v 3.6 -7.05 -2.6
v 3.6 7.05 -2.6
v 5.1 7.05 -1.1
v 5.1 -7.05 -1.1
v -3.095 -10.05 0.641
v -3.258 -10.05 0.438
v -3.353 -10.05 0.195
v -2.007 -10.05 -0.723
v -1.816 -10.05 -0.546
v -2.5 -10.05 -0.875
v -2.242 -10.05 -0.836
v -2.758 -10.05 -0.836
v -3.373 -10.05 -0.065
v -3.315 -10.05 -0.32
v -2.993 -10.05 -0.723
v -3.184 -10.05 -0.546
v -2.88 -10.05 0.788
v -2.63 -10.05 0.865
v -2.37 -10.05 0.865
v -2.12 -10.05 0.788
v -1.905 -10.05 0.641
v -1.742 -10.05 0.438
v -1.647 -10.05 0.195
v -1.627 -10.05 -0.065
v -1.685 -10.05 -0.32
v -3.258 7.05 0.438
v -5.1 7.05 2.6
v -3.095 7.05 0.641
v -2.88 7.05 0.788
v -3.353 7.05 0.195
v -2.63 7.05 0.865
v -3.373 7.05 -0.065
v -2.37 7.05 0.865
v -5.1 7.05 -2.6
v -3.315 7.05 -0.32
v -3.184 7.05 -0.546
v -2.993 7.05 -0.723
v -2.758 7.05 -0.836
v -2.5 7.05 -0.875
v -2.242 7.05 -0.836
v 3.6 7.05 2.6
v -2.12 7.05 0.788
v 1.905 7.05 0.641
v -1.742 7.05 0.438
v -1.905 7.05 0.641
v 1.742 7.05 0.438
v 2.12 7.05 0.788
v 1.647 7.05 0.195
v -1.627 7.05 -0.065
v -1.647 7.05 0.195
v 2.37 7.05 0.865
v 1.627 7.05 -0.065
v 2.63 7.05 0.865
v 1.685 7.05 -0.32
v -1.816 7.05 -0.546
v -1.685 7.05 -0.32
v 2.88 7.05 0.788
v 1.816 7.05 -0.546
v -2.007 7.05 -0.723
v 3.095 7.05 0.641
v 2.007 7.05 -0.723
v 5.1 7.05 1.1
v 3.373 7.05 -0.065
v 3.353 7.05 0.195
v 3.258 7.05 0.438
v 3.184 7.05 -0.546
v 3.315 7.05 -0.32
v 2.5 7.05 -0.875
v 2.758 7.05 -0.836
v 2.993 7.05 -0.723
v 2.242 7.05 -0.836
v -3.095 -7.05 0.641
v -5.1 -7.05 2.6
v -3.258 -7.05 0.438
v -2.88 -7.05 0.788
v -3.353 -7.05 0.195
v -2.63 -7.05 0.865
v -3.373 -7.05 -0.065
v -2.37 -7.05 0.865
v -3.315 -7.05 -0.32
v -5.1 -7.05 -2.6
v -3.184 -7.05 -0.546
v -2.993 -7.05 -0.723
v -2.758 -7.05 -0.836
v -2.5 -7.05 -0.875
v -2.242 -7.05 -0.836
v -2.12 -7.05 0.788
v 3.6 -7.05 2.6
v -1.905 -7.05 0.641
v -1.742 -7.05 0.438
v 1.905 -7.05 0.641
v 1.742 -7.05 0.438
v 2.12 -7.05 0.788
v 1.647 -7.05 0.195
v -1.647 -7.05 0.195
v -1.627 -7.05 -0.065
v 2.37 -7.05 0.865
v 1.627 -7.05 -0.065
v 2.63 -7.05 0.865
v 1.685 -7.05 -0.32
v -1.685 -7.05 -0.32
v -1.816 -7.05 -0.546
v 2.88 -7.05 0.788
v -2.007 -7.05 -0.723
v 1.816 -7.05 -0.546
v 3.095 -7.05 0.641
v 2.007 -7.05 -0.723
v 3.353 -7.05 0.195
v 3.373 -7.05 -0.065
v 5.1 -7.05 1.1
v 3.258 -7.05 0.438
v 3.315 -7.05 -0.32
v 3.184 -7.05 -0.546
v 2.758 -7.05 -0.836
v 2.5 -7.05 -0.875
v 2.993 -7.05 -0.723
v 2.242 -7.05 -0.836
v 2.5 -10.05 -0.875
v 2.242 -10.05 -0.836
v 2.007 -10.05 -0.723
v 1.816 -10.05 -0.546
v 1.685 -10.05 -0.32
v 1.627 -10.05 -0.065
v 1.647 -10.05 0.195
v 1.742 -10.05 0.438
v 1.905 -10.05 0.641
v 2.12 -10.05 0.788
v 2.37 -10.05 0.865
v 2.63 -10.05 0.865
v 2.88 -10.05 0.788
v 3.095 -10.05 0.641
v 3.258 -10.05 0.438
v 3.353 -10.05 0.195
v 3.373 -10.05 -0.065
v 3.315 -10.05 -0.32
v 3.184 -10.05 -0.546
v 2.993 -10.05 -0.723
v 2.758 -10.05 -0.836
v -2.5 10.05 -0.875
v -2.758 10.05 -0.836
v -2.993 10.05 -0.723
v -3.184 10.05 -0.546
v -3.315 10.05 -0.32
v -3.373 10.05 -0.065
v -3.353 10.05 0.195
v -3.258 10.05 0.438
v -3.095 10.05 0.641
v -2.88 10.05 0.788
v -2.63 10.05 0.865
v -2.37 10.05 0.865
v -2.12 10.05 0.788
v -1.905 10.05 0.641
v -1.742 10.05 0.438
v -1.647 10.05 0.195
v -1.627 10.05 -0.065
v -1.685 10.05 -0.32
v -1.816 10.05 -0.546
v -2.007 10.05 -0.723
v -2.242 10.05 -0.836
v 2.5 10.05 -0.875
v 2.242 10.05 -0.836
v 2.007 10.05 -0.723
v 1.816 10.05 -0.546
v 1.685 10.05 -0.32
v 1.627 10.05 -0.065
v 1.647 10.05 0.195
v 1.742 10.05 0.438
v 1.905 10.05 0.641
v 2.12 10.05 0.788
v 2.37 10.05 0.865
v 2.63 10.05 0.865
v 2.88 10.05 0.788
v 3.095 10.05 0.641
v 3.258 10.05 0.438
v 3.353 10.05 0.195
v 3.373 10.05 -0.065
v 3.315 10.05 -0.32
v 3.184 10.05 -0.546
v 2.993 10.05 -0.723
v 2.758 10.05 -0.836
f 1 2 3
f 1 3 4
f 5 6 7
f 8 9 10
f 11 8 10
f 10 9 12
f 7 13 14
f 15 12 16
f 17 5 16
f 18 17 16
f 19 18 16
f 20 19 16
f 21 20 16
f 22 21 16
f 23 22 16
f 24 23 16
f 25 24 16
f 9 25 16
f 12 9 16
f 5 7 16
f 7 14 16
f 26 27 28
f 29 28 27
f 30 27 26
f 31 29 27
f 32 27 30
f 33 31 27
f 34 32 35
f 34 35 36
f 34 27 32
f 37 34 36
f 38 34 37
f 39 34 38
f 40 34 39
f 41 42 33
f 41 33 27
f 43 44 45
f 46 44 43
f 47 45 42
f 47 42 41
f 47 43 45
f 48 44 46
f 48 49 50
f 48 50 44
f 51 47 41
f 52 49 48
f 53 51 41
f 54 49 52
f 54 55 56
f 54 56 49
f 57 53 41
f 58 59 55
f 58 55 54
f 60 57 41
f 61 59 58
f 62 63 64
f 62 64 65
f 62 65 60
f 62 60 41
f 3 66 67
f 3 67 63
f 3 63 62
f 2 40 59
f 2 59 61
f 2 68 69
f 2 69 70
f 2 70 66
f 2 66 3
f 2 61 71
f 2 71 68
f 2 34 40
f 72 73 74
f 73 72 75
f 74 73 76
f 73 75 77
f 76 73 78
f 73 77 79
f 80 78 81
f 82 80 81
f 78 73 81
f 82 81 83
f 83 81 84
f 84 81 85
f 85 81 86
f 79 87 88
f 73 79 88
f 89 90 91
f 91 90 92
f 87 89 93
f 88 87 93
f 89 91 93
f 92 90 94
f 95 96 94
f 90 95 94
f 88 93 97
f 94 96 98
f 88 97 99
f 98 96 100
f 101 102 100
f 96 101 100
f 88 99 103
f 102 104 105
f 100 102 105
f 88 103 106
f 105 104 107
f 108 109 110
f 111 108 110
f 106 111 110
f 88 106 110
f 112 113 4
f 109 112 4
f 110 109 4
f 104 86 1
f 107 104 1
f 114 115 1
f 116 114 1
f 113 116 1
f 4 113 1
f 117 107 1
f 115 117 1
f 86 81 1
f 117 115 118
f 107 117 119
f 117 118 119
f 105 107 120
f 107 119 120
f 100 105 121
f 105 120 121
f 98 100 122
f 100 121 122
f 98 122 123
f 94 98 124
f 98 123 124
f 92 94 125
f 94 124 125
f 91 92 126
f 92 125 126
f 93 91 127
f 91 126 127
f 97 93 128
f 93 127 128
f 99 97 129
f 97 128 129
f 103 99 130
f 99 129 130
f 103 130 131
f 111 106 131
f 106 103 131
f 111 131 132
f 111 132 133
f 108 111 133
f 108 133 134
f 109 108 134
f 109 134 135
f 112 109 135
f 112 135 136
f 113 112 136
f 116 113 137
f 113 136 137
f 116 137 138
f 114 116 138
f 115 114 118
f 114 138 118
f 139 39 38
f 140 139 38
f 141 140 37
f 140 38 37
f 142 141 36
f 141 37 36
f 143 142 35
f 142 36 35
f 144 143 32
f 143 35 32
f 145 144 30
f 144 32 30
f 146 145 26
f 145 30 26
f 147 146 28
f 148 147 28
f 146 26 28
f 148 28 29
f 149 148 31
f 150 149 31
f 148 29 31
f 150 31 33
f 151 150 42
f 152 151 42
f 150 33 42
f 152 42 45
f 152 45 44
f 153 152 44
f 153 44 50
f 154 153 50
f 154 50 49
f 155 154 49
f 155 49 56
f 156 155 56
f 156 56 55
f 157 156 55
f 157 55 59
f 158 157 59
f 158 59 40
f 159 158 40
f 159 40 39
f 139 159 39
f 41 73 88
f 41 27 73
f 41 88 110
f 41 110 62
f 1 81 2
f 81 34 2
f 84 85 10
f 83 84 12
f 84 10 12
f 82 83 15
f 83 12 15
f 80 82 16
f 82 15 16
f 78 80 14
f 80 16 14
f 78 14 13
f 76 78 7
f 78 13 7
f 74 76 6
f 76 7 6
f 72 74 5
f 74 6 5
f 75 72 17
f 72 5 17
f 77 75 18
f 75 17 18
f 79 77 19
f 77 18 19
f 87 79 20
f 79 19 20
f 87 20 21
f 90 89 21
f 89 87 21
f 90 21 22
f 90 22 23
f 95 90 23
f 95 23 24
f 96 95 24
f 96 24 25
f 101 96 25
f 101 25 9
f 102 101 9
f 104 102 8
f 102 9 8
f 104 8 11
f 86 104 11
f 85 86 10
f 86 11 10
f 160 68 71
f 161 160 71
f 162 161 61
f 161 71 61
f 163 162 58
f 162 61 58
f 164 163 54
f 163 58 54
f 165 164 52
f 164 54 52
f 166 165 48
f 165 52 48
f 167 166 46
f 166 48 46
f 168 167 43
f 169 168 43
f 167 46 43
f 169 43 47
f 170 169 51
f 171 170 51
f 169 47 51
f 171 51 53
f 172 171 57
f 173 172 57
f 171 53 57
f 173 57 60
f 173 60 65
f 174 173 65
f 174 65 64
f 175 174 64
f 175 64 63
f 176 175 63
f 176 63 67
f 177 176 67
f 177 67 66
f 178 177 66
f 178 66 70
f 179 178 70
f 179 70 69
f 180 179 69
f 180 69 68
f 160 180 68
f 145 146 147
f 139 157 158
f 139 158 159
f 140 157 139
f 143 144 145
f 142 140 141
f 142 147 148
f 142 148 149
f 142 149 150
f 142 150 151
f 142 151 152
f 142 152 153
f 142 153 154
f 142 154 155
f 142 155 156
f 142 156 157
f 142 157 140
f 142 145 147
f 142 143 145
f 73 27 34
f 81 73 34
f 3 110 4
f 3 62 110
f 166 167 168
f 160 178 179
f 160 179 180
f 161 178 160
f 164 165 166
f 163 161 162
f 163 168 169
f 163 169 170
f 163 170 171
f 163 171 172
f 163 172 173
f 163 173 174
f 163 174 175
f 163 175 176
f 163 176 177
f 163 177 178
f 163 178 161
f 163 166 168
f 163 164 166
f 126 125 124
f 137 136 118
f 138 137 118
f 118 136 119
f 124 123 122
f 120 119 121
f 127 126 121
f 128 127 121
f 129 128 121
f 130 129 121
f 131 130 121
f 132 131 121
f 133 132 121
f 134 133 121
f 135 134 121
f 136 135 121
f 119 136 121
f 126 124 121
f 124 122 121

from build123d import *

# Parameters (mm, degrees)
SKETCH1_W                = 10.2
SKETCH1_H                = 5.2
BOSS_EXTRUDE1_DEPTH      = 7.05
CHAMFER1_SIZE            = 1.5
BOSS_EXTRUDE2_DEPTH      = 10.05
BOSS_EXTRUDE2_DEPTH_BACK = 10.05
SKETCH2_R                = 0.875


with BuildPart() as part:
    # Sketch1 → Boss-Extrude1 (new, symmetric)
    with BuildSketch(Plane(origin=(0, 0, 0), x_dir=(1, 0, 0), z_dir=(0, 1, 0))):
        Rectangle(SKETCH1_W, SKETCH1_H)
    extrude(amount=BOSS_EXTRUDE1_DEPTH, both=True)

    # Chamfer1
    chamfer1_edges = [part.edges().sort_by_distance(p)[0] for p in [
        (5.1, 0, 2.6),
        (5.1, 0, -2.6),
    ]]
    chamfer(chamfer1_edges, length=CHAMFER1_SIZE)

    # Sketch2 → Boss-Extrude2 (add, two sides: drawn at the far end of the back side and taken through both)
    with BuildSketch(Plane(origin=(0, 0, 0), x_dir=(1, 0, 0), z_dir=(0, 1, 0)).offset(-BOSS_EXTRUDE2_DEPTH_BACK)):
        with Locations(Location((-2.5, 0, 0), (0, 0, 90))):
            Circle(SKETCH2_R)
        with Locations(Location((2.5, 0, 0), (0, 0, 90))):
            Circle(SKETCH2_R)
    extrude(amount=BOSS_EXTRUDE2_DEPTH + BOSS_EXTRUDE2_DEPTH_BACK)


solid = part.part
